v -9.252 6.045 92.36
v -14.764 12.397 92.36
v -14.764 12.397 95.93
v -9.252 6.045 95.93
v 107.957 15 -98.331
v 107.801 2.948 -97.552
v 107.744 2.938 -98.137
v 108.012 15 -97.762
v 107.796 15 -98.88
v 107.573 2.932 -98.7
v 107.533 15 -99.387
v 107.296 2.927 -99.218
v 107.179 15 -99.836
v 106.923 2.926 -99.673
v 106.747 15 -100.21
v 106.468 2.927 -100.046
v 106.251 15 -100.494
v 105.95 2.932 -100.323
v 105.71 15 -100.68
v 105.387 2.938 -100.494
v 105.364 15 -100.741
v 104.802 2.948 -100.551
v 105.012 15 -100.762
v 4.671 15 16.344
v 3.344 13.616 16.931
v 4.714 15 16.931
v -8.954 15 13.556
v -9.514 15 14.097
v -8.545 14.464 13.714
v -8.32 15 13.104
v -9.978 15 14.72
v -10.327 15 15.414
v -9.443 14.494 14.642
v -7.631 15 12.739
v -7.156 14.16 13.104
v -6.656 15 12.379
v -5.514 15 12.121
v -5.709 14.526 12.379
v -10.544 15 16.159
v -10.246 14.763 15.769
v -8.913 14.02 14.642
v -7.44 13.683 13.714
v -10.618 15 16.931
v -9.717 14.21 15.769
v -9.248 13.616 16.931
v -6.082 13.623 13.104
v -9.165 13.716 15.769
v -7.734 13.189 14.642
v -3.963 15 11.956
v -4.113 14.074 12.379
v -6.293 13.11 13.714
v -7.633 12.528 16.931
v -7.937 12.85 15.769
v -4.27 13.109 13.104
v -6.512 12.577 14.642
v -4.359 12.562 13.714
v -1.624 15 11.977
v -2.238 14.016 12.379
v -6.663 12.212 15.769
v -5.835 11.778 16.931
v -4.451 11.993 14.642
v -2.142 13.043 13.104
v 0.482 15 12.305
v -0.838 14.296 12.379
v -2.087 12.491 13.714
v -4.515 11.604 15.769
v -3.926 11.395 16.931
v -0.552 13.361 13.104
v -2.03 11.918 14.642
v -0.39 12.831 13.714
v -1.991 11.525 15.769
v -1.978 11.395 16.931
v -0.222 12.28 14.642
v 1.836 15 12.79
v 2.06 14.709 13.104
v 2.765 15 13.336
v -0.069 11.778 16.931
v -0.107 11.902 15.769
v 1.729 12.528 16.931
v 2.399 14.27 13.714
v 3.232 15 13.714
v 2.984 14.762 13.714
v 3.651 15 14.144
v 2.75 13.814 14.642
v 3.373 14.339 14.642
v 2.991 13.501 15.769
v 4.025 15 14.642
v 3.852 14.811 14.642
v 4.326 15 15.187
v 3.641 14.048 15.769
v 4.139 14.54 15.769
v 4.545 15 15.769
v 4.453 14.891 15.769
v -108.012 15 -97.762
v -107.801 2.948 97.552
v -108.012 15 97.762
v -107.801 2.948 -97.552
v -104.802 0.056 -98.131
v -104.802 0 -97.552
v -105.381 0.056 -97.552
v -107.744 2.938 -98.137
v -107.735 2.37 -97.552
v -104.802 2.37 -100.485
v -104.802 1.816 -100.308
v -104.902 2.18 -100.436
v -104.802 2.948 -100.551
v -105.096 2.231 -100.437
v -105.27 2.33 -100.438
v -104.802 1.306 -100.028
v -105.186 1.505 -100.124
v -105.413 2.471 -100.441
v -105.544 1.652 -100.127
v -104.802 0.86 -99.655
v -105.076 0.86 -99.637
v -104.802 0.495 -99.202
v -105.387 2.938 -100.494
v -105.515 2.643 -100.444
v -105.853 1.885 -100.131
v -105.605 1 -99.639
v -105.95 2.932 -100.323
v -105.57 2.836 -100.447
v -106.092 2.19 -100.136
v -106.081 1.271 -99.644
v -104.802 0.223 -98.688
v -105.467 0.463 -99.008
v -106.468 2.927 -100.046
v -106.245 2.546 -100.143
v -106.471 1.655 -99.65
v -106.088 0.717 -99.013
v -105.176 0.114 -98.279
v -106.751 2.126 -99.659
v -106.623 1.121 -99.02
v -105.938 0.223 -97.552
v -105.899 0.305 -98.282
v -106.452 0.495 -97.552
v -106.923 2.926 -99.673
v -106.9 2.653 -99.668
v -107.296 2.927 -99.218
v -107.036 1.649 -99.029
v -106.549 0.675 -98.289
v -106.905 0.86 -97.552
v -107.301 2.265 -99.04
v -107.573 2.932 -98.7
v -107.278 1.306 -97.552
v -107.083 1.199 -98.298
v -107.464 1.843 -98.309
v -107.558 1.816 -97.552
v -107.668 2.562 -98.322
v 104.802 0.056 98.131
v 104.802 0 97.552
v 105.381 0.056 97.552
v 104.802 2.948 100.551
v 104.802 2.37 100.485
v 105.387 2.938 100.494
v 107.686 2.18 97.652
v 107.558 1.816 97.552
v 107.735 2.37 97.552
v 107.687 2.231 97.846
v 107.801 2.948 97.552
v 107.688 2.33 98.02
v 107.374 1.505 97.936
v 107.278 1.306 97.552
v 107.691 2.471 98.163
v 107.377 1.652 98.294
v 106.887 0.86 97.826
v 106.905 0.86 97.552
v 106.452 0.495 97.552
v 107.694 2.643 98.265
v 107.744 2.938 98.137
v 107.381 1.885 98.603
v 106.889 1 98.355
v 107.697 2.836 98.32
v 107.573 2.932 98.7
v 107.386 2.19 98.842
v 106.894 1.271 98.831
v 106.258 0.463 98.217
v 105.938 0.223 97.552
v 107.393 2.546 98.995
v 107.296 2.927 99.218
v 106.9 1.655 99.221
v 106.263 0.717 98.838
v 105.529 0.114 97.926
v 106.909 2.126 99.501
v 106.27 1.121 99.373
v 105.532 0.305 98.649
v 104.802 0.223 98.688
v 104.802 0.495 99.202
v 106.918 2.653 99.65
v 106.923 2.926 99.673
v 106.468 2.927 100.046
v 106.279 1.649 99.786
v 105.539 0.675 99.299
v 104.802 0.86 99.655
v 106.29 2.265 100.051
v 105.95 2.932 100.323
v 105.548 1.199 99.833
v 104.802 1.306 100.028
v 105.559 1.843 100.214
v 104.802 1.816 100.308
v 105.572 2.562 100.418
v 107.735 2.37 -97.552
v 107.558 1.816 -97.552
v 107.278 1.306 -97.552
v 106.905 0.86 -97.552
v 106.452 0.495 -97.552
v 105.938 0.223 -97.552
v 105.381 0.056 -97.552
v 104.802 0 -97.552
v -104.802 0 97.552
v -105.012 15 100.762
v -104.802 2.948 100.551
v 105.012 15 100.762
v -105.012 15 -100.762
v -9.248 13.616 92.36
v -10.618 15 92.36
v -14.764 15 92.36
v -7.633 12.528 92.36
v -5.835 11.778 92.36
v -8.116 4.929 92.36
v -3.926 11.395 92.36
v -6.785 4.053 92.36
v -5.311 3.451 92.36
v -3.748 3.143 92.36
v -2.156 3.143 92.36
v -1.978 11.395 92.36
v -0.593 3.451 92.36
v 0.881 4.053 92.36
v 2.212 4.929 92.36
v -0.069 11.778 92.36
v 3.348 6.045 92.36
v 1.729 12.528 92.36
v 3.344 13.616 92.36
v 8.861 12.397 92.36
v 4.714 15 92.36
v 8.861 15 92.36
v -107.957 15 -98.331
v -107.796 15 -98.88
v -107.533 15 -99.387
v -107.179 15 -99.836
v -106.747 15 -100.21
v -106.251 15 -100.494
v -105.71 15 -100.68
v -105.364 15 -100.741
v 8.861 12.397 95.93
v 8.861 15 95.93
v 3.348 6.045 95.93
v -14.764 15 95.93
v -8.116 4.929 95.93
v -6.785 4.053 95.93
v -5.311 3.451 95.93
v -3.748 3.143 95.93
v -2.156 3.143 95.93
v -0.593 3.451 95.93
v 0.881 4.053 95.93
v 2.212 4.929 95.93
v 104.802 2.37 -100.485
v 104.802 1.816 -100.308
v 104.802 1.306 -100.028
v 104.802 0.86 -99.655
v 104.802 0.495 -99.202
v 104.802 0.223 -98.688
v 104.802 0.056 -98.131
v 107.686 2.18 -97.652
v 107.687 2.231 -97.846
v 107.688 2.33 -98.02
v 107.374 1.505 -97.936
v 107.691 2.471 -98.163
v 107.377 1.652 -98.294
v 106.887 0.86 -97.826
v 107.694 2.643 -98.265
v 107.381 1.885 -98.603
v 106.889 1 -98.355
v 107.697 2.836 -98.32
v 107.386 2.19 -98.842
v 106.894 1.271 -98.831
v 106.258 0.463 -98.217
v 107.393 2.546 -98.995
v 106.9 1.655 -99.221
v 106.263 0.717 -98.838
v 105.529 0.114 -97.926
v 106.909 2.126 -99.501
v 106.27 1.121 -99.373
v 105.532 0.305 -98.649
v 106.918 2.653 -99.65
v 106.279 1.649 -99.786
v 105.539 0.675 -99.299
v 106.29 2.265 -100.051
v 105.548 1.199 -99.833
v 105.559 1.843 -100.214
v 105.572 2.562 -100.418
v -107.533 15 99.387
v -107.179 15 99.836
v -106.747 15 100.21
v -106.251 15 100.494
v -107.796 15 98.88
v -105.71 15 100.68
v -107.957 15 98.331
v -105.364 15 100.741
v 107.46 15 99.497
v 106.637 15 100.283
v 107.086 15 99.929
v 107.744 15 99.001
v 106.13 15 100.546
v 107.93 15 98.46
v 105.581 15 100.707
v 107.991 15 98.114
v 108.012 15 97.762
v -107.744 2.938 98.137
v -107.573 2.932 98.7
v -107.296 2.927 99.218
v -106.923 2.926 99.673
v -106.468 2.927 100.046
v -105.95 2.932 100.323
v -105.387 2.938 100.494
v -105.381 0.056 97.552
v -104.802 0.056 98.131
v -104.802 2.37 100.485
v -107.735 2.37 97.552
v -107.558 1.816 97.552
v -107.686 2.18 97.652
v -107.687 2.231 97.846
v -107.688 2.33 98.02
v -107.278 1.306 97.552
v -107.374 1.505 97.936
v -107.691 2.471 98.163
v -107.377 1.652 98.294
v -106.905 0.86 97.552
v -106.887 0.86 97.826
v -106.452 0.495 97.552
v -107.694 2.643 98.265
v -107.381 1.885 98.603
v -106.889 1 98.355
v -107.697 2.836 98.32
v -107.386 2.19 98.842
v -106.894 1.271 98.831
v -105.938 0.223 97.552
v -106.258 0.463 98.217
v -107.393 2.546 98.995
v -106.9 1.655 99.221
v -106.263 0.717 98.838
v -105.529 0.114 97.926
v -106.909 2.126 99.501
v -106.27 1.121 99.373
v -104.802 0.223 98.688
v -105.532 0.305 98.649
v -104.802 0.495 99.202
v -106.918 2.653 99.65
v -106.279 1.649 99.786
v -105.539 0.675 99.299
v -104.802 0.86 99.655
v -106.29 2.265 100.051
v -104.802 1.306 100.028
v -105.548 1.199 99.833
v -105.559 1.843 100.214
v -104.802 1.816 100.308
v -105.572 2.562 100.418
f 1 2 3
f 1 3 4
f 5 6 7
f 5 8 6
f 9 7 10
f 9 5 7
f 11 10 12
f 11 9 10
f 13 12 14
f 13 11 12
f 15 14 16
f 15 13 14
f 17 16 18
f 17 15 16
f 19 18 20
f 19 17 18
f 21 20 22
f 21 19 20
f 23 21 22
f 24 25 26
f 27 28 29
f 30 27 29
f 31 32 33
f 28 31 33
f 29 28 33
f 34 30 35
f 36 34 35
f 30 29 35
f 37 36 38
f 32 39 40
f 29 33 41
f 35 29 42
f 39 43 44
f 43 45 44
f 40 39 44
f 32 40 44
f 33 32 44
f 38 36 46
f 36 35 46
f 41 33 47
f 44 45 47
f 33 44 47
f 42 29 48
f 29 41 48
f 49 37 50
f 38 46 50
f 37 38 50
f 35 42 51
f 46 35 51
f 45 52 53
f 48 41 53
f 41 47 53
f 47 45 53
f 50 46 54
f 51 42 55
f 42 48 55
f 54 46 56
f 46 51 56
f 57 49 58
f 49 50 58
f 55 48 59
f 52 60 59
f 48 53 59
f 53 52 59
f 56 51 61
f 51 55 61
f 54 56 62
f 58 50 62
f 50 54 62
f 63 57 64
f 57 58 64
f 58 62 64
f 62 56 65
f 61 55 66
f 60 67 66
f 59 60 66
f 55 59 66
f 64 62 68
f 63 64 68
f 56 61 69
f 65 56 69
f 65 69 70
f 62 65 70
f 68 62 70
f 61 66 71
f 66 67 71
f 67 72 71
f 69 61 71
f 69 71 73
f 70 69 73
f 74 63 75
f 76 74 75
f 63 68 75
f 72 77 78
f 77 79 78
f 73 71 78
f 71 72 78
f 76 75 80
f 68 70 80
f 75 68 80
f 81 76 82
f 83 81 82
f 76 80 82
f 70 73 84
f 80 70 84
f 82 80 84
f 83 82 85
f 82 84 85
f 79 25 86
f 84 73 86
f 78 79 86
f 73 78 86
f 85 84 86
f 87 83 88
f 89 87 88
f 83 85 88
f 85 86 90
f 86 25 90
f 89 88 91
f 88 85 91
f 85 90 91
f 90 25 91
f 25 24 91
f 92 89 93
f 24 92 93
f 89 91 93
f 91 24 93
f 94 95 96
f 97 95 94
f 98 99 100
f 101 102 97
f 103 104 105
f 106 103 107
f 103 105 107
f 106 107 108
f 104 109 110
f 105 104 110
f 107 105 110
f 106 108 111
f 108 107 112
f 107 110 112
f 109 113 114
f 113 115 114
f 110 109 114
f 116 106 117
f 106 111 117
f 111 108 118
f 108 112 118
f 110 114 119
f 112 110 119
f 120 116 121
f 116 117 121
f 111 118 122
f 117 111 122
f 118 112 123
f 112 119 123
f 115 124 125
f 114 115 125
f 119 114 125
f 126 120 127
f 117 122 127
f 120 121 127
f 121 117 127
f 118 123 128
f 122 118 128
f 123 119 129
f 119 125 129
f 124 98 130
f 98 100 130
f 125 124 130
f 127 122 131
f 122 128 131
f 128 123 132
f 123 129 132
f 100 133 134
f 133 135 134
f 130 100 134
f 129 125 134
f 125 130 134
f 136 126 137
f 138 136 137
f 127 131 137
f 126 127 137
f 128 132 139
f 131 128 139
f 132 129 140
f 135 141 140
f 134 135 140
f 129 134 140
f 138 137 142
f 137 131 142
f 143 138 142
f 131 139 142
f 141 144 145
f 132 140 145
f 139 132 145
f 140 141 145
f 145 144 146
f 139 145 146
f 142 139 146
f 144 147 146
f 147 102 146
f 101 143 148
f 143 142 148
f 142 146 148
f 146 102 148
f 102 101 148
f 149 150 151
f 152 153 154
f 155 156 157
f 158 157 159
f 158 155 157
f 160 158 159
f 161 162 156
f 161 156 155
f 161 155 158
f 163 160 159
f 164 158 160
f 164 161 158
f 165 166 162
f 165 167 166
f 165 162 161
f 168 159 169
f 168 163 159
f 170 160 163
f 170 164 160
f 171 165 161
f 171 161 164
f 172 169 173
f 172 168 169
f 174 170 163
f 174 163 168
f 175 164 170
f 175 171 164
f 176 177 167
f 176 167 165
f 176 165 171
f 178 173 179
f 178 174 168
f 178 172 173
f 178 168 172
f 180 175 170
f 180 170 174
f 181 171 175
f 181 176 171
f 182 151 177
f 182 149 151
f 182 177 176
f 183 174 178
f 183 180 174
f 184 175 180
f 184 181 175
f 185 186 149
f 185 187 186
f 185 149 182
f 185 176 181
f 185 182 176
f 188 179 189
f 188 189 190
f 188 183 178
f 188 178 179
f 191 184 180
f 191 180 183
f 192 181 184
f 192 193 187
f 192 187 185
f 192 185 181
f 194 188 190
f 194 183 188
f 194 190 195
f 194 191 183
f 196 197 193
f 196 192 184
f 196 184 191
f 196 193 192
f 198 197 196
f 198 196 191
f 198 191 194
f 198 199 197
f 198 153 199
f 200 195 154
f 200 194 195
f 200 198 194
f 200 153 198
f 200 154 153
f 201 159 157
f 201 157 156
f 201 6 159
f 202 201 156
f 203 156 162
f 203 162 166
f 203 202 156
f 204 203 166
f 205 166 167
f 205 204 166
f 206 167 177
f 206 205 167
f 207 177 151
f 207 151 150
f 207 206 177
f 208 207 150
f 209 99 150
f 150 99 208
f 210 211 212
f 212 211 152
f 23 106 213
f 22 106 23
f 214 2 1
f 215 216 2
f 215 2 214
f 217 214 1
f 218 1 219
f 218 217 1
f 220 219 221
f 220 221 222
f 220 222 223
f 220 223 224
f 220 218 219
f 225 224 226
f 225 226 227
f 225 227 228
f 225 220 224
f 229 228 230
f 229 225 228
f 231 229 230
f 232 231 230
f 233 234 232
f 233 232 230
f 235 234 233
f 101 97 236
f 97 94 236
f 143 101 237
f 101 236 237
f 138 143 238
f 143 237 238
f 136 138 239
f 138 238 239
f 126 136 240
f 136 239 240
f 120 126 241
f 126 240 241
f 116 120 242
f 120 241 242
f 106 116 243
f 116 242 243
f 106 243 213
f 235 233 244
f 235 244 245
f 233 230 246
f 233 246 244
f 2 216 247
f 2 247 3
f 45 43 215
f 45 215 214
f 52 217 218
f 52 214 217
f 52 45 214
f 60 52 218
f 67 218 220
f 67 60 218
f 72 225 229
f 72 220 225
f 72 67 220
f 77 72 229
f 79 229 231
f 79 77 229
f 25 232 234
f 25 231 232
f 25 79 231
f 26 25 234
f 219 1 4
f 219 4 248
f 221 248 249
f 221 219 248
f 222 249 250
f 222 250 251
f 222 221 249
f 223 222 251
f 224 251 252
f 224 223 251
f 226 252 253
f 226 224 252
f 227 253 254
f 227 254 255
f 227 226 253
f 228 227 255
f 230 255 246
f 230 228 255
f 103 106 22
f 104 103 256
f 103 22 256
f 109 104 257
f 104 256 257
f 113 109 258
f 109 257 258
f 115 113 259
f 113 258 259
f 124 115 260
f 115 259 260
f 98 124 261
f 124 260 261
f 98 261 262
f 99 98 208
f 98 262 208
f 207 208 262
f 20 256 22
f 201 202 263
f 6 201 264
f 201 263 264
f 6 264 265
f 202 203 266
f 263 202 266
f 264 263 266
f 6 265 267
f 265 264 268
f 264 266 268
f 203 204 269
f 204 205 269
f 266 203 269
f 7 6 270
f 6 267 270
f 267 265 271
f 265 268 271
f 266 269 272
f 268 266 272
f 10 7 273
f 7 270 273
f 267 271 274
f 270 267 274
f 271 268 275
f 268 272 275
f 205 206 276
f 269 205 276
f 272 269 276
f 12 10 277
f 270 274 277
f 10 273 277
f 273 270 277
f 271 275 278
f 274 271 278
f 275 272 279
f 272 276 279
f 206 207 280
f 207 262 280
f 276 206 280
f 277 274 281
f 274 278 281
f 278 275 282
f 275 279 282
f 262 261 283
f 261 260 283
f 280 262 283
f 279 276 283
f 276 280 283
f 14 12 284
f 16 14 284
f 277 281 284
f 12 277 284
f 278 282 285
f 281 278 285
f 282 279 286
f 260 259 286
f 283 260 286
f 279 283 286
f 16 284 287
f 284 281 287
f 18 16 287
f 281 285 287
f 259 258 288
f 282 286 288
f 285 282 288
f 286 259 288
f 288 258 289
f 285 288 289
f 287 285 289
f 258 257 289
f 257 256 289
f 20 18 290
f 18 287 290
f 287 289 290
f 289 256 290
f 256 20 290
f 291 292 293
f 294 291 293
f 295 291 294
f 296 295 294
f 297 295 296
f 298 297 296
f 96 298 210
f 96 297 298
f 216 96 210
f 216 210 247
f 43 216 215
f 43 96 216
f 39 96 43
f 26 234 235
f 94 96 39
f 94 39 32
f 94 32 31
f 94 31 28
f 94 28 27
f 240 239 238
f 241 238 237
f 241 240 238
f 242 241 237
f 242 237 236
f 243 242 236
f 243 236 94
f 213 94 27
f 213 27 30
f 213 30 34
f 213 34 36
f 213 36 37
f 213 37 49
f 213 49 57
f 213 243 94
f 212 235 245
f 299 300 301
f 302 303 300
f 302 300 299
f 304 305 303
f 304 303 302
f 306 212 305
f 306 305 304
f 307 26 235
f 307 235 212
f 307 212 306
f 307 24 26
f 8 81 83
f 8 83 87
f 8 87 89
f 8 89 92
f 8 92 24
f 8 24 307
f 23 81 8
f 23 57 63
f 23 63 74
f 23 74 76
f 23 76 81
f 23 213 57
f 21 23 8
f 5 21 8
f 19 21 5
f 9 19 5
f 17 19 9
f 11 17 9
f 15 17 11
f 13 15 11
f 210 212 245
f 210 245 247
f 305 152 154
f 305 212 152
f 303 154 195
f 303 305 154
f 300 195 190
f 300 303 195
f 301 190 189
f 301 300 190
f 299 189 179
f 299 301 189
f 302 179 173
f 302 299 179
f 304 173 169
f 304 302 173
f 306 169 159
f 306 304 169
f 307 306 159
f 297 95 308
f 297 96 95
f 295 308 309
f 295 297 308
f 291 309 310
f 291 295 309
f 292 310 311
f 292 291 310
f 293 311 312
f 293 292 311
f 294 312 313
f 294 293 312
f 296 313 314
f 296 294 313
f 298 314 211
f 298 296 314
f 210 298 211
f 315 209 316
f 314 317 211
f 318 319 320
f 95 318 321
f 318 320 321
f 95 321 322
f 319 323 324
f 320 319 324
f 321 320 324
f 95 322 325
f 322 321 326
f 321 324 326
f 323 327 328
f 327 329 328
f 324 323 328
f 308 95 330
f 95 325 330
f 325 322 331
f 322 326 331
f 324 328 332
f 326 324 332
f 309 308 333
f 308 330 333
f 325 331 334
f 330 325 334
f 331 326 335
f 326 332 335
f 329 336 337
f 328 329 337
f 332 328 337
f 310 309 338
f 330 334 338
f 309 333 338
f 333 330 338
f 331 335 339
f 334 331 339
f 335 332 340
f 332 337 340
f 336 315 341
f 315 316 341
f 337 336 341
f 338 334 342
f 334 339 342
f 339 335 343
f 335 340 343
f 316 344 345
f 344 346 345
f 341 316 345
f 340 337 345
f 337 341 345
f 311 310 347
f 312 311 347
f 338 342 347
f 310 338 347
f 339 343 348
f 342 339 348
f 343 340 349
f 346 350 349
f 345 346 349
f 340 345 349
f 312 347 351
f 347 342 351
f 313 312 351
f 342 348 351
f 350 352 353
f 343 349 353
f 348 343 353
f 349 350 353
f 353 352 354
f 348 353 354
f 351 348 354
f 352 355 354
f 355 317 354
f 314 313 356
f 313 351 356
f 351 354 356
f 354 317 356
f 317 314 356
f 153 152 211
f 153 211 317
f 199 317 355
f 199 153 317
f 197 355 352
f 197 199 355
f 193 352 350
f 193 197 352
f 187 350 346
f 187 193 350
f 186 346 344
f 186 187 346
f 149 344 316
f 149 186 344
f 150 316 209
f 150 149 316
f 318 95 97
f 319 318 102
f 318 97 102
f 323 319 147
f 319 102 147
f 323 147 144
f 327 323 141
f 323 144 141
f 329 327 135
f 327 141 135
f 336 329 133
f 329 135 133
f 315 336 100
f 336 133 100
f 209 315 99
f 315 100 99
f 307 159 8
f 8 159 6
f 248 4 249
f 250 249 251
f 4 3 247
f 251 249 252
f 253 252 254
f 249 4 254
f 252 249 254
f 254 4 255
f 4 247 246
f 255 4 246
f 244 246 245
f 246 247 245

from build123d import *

# Parameters (mm, degrees)
SKETCH1_W           = 215.5
SKETCH1_H           = 201
BOSS_EXTRUDE1_DEPTH = 15
BOSS_EXTRUDE1_DRAFT = -1
FILLET1_R           = 3
CAVITY1_START       = 16.930808083
CAVITY1_DEPTH       = 78.999015724
CAVITY1_START_2     = 92.359823807
CAVITY1_2_DEPTH     = 3.57


with BuildPart() as part:
    # Sketch1 → Boss-Extrude1 (with draft: the straight prism first)
    with BuildSketch(Plane(origin=(0, 0, 0), x_dir=(1, 0, 0), z_dir=(0, 1, 0))):
        Rectangle(SKETCH1_W, SKETCH1_H)
    extrude(amount=BOSS_EXTRUDE1_DEPTH)
    # Boss-Extrude1: the draft: its side faces are tilted about the plane it starts from
    boss_extrude1_sides = [part.faces().sort_by_distance(p)[0] for p in [
        (0, 7.5, 100.5),
        (107.75, 7.5, 0),
        (0, 7.5, -100.5),
        (-107.75, 7.5, 0),
    ]]
    draft(boss_extrude1_sides, Plane(origin=(0, 0, 0), x_dir=(1, 0, 0), z_dir=(0, 1, 0)), BOSS_EXTRUDE1_DRAFT)

    # Fillet1
    fillet1_edges = [part.edges().sort_by_distance(p)[0] for p in [
        (0, 0, 100.5),
        (-107.75, 0, 0),
        (0, 0, -100.5),
        (107.75, 0, 0),
        (107.880912987, 7.5, 100.630912987),
        (-107.880912987, 7.5, 100.630912987),
        (-107.880912987, 7.5, -100.630912987),
        (107.880912987, 7.5, -100.630912987),
    ]]
    fillet(fillet1_edges, radius=FILLET1_R)

    # Cavity1: read off the stored shape, not the designer's step
    # Cavity1 outline → Cavity1 (cut)
    with BuildSketch(Plane.XY.offset(CAVITY1_START)):
        with BuildLine():
            ThreePointArc((-10.617650831, 15), (-2.951958482, 11.347239001), (4.713733868, 15))
            Line((4.713733868, 15), (-10.617650831, 15))
        make_face()
    extrude(amount=CAVITY1_DEPTH, mode=Mode.SUBTRACT)

    # Cavity1 2 outline → Cavity1 2 (cut)
    with BuildSketch(Plane.XY.offset(CAVITY1_START_2)):
        with BuildLine():
            Line((8.860541518, 15), (4.713733868, 15))
            ThreePointArc((4.713733868, 15), (-2.951958482, 11.347239001), (-10.617650831, 15))
            Line((-10.617650831, 15), (-14.764458482, 15))
            Line((-14.764458482, 15), (-14.764458482, 12.397239001))
            Line((-14.764458482, 12.397239001), (-9.251958482, 6.044739001))
            ThreePointArc((-9.251958482, 6.044739001), (-2.951958482, 3.104739001), (3.348041518, 6.044739001))
            Line((3.348041518, 6.044739001), (8.860541518, 12.397239001))
            Line((8.860541518, 12.397239001), (8.860541518, 15))
        make_face()
    extrude(amount=CAVITY1_2_DEPTH, mode=Mode.SUBTRACT)

    # Cavity1 3 outline → Cavity1 3 (revolve, cut)
    with BuildSketch(Plane(origin=(-2.951958482, 21.217239001, 0), x_dir=(1, 0, 0), z_dir=(0, -1, 0))):
        with BuildLine():
            ThreePointArc((6.217239001, 11.929675453), (8.859575731, 13.83427815), (9.87, 16.930808083))
            Line((9.87, 16.930808083), (6.217239001, 16.930808083))
            Line((6.217239001, 16.930808083), (6.217239001, 11.929675453))
        make_face()
    revolve(axis=Axis((-2.951958482, 21.217239001, 0), (0, 0, 1)), mode=Mode.SUBTRACT)


solid = part.part
